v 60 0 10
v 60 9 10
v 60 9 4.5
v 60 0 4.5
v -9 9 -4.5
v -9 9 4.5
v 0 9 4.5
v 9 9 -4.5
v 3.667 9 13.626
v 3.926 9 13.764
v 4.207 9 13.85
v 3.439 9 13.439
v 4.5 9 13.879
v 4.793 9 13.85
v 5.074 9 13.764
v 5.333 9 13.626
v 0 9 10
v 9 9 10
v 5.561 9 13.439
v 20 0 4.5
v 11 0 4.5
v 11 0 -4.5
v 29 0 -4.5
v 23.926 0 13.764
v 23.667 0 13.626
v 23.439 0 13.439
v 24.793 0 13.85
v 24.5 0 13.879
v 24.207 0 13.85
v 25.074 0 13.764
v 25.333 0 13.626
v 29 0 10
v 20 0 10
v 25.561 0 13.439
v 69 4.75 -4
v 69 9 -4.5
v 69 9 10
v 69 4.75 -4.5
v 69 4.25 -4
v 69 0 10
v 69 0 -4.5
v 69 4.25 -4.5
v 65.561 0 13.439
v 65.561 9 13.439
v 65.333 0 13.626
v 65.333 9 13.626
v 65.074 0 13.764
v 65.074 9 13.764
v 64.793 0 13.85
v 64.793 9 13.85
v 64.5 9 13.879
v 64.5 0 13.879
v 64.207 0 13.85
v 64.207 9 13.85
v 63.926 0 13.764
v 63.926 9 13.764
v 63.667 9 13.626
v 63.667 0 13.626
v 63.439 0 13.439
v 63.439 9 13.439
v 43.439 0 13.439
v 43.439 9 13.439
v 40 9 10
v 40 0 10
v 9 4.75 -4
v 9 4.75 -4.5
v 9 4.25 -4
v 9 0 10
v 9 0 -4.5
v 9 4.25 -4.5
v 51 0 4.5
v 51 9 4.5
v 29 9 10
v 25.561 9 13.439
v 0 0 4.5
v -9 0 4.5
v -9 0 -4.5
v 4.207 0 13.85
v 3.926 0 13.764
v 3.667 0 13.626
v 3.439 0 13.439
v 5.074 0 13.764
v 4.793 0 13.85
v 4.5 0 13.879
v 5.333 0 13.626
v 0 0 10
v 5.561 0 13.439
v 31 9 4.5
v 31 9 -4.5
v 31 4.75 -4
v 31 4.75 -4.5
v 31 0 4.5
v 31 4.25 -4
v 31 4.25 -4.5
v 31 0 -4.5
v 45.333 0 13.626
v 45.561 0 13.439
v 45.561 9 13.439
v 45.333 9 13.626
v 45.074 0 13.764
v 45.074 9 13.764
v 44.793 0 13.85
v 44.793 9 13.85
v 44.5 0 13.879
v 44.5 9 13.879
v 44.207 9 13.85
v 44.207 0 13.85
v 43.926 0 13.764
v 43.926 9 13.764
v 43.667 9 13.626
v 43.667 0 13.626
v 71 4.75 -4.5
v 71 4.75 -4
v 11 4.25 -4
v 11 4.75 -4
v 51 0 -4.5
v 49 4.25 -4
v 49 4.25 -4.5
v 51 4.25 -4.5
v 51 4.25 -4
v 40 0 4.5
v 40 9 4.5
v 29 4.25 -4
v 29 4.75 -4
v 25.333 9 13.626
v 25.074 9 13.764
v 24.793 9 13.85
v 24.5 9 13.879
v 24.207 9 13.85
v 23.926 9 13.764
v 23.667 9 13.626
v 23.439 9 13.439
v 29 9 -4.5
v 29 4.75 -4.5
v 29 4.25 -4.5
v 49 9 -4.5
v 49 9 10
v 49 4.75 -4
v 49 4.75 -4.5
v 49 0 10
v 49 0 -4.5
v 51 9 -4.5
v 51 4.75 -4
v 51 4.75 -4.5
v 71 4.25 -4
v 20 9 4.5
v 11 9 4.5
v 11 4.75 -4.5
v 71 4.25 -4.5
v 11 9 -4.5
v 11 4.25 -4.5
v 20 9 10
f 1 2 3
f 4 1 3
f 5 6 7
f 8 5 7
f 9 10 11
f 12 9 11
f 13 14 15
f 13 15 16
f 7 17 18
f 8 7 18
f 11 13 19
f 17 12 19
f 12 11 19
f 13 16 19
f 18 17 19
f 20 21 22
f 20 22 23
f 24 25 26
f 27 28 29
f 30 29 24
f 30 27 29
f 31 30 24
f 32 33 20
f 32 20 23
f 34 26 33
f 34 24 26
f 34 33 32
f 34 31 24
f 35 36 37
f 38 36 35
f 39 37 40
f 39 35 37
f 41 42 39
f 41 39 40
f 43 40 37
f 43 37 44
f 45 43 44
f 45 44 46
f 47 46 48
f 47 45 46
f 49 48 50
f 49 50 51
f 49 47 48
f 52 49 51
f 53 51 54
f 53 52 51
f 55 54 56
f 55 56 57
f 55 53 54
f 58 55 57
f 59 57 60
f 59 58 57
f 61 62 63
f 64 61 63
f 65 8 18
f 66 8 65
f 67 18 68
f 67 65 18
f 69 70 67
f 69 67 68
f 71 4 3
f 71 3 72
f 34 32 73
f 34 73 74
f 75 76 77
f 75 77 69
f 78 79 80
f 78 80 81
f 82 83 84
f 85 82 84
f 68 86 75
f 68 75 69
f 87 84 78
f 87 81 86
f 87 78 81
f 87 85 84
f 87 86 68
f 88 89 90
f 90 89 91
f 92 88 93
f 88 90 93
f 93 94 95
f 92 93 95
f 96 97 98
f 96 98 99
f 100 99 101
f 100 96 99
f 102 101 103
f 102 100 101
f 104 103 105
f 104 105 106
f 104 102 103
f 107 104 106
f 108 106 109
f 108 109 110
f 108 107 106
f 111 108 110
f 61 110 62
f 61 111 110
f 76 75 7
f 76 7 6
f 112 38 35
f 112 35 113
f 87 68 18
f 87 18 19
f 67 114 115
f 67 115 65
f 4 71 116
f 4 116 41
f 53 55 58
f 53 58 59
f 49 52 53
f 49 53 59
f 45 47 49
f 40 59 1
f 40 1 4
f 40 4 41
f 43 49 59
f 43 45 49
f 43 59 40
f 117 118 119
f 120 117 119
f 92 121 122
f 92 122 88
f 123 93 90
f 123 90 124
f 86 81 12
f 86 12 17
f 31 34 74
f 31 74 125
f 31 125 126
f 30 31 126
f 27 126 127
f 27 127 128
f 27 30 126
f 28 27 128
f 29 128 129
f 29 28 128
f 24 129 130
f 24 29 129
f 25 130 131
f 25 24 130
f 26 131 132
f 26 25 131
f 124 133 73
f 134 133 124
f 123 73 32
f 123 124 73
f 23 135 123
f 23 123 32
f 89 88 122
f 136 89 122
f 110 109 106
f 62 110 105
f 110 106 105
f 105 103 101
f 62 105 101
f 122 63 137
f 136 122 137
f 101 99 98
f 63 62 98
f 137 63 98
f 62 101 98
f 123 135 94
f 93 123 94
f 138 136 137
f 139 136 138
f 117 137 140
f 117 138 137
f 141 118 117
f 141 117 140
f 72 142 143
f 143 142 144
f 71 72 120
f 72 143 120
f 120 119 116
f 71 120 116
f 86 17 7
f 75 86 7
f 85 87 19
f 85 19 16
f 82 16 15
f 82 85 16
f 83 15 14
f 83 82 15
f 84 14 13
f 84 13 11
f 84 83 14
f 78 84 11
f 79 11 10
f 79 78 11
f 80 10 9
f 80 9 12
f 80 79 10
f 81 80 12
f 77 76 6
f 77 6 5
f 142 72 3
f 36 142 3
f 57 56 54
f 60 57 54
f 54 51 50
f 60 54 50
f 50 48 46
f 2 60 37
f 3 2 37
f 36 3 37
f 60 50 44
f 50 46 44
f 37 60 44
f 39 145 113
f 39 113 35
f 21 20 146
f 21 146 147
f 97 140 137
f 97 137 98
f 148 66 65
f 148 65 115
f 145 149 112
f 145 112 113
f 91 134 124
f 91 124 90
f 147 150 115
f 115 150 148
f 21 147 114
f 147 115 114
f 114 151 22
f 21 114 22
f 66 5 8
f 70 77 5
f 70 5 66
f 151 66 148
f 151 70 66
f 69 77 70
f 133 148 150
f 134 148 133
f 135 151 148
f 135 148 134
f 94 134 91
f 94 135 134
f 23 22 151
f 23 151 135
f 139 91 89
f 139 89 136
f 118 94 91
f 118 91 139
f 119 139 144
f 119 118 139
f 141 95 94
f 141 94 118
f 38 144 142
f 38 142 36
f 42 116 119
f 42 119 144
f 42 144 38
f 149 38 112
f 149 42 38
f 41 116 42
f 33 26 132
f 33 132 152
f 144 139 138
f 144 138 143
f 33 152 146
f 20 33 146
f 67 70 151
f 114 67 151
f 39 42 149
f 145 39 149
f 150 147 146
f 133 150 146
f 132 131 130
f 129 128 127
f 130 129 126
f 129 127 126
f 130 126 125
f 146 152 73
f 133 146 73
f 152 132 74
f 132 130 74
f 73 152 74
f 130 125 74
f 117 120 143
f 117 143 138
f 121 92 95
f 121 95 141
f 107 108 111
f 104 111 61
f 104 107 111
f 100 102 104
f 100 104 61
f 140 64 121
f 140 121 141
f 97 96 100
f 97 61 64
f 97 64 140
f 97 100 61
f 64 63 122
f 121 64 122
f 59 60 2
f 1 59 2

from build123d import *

# Parameters (mm, degrees)
F1_DEPTH = 9
F2_W     = 2
F2_H     = 4.25
F3_DEPTH = 18.3796796564


# Not quite as in the source:
# - a feature names something its author has since deleted; it is built from what else it names


with BuildPart() as f1:
    # F0 (on Front) → F1 (new body)
    with BuildSketch(Plane.XZ):
        with BuildLine():
            Line((-9, -4.5), (9, -4.5))
            Line((9, -4.5), (11, -4.5))
            Line((11, -4.5), (11, -4))
            Line((11, -4), (9, -4))
            Line((9, -4), (9, 4.5))
            Line((9, 4.5), (9, 10))
            Line((9, 10), (5.5606601718, 13.4393398282))
            ThreePointArc((5.5606601718, 13.4393398282), (4.5, 13.8786796564), (3.4393398282, 13.4393398282))
            Line((3.4393398282, 13.4393398282), (0, 10))
            Line((0, 10), (0, 4.5))
            Line((0, 4.5), (-9, 4.5))
            Line((-9, 4.5), (-9, -4.5))
        make_face()
        with BuildLine():
            Line((11, -4), (11, -4.5))
            Line((11, -4.5), (29, -4.5))
            Line((29, -4.5), (31, -4.5))
            Line((31, -4.5), (31, -4))
            Line((31, -4), (29, -4))
            Line((29, -4), (29, 4.5))
            Line((29, 4.5), (29, 10))
            Line((29, 10), (25.5606601718, 13.4393398282))
            ThreePointArc((25.5606601718, 13.4393398282), (24.5, 13.8786796564), (23.4393398282, 13.4393398282))
            Line((23.4393398282, 13.4393398282), (20, 10))
            Line((20, 10), (20, 4.5))
            Line((20, 4.5), (11, 4.5))
            Line((11, 4.5), (11, -4))
        make_face()
        with BuildLine():
            Line((31, -4), (31, -4.5))
            Line((31, -4.5), (49, -4.5))
            Line((49, -4.5), (51, -4.5))
            Line((51, -4.5), (51, -4))
            Line((51, -4), (49, -4))
            Line((49, -4), (49, 4.5))
            Line((49, 4.5), (49, 10))
            Line((49, 10), (45.5606601718, 13.4393398282))
            ThreePointArc((45.5606601718, 13.4393398282), (44.5, 13.8786796564), (43.4393398282, 13.4393398282))
            Line((43.4393398282, 13.4393398282), (40, 10))
            Line((40, 10), (40, 4.5))
            Line((40, 4.5), (31, 4.5))
            Line((31, 4.5), (31, -4))
        make_face()
        with BuildLine():
            Line((51, -4), (51, -4.5))
            Line((51, -4.5), (69, -4.5))
            Line((69, -4.5), (71, -4.5))
            Line((71, -4.5), (71, -4))
            Line((71, -4), (69, -4))
            Line((69, -4), (69, 4.5))
            Line((69, 4.5), (69, 10))
            Line((69, 10), (65.5606601718, 13.4393398282))
            ThreePointArc((65.5606601718, 13.4393398282), (64.5, 13.8786796564), (63.4393398282, 13.4393398282))
            Line((63.4393398282, 13.4393398282), (60, 10))
            Line((60, 10), (60, 4.5))
            Line((60, 4.5), (51, 4.5))
            Line((51, 4.5), (51, -4))
        make_face()
    extrude(amount=-F1_DEPTH)

    # F2 (on face) → F3 (cut, through all)
    with BuildSketch(Plane(origin=(0, 0, -4.5), x_dir=(1, 0, 0), z_dir=(0, 0, -1))):
        with Locations((10, -2.125)):
            Rectangle(F2_W, F2_H)
        with Locations((10, -6.875)):
            Rectangle(F2_W, F2_H)
        with Locations((30, -2.125)):
            Rectangle(F2_W, F2_H)
        with Locations((30, -6.875)):
            Rectangle(F2_W, F2_H)
        with Locations((50, -2.125)):
            Rectangle(F2_W, F2_H)
        with Locations((50, -6.875)):
            Rectangle(F2_W, F2_H)
        with Locations((70, -2.125)):
            Rectangle(F2_W, F2_H)
        with Locations((70, -6.875)):
            Rectangle(F2_W, F2_H)
    extrude(amount=-F3_DEPTH, mode=Mode.SUBTRACT)


solid = f1.part
